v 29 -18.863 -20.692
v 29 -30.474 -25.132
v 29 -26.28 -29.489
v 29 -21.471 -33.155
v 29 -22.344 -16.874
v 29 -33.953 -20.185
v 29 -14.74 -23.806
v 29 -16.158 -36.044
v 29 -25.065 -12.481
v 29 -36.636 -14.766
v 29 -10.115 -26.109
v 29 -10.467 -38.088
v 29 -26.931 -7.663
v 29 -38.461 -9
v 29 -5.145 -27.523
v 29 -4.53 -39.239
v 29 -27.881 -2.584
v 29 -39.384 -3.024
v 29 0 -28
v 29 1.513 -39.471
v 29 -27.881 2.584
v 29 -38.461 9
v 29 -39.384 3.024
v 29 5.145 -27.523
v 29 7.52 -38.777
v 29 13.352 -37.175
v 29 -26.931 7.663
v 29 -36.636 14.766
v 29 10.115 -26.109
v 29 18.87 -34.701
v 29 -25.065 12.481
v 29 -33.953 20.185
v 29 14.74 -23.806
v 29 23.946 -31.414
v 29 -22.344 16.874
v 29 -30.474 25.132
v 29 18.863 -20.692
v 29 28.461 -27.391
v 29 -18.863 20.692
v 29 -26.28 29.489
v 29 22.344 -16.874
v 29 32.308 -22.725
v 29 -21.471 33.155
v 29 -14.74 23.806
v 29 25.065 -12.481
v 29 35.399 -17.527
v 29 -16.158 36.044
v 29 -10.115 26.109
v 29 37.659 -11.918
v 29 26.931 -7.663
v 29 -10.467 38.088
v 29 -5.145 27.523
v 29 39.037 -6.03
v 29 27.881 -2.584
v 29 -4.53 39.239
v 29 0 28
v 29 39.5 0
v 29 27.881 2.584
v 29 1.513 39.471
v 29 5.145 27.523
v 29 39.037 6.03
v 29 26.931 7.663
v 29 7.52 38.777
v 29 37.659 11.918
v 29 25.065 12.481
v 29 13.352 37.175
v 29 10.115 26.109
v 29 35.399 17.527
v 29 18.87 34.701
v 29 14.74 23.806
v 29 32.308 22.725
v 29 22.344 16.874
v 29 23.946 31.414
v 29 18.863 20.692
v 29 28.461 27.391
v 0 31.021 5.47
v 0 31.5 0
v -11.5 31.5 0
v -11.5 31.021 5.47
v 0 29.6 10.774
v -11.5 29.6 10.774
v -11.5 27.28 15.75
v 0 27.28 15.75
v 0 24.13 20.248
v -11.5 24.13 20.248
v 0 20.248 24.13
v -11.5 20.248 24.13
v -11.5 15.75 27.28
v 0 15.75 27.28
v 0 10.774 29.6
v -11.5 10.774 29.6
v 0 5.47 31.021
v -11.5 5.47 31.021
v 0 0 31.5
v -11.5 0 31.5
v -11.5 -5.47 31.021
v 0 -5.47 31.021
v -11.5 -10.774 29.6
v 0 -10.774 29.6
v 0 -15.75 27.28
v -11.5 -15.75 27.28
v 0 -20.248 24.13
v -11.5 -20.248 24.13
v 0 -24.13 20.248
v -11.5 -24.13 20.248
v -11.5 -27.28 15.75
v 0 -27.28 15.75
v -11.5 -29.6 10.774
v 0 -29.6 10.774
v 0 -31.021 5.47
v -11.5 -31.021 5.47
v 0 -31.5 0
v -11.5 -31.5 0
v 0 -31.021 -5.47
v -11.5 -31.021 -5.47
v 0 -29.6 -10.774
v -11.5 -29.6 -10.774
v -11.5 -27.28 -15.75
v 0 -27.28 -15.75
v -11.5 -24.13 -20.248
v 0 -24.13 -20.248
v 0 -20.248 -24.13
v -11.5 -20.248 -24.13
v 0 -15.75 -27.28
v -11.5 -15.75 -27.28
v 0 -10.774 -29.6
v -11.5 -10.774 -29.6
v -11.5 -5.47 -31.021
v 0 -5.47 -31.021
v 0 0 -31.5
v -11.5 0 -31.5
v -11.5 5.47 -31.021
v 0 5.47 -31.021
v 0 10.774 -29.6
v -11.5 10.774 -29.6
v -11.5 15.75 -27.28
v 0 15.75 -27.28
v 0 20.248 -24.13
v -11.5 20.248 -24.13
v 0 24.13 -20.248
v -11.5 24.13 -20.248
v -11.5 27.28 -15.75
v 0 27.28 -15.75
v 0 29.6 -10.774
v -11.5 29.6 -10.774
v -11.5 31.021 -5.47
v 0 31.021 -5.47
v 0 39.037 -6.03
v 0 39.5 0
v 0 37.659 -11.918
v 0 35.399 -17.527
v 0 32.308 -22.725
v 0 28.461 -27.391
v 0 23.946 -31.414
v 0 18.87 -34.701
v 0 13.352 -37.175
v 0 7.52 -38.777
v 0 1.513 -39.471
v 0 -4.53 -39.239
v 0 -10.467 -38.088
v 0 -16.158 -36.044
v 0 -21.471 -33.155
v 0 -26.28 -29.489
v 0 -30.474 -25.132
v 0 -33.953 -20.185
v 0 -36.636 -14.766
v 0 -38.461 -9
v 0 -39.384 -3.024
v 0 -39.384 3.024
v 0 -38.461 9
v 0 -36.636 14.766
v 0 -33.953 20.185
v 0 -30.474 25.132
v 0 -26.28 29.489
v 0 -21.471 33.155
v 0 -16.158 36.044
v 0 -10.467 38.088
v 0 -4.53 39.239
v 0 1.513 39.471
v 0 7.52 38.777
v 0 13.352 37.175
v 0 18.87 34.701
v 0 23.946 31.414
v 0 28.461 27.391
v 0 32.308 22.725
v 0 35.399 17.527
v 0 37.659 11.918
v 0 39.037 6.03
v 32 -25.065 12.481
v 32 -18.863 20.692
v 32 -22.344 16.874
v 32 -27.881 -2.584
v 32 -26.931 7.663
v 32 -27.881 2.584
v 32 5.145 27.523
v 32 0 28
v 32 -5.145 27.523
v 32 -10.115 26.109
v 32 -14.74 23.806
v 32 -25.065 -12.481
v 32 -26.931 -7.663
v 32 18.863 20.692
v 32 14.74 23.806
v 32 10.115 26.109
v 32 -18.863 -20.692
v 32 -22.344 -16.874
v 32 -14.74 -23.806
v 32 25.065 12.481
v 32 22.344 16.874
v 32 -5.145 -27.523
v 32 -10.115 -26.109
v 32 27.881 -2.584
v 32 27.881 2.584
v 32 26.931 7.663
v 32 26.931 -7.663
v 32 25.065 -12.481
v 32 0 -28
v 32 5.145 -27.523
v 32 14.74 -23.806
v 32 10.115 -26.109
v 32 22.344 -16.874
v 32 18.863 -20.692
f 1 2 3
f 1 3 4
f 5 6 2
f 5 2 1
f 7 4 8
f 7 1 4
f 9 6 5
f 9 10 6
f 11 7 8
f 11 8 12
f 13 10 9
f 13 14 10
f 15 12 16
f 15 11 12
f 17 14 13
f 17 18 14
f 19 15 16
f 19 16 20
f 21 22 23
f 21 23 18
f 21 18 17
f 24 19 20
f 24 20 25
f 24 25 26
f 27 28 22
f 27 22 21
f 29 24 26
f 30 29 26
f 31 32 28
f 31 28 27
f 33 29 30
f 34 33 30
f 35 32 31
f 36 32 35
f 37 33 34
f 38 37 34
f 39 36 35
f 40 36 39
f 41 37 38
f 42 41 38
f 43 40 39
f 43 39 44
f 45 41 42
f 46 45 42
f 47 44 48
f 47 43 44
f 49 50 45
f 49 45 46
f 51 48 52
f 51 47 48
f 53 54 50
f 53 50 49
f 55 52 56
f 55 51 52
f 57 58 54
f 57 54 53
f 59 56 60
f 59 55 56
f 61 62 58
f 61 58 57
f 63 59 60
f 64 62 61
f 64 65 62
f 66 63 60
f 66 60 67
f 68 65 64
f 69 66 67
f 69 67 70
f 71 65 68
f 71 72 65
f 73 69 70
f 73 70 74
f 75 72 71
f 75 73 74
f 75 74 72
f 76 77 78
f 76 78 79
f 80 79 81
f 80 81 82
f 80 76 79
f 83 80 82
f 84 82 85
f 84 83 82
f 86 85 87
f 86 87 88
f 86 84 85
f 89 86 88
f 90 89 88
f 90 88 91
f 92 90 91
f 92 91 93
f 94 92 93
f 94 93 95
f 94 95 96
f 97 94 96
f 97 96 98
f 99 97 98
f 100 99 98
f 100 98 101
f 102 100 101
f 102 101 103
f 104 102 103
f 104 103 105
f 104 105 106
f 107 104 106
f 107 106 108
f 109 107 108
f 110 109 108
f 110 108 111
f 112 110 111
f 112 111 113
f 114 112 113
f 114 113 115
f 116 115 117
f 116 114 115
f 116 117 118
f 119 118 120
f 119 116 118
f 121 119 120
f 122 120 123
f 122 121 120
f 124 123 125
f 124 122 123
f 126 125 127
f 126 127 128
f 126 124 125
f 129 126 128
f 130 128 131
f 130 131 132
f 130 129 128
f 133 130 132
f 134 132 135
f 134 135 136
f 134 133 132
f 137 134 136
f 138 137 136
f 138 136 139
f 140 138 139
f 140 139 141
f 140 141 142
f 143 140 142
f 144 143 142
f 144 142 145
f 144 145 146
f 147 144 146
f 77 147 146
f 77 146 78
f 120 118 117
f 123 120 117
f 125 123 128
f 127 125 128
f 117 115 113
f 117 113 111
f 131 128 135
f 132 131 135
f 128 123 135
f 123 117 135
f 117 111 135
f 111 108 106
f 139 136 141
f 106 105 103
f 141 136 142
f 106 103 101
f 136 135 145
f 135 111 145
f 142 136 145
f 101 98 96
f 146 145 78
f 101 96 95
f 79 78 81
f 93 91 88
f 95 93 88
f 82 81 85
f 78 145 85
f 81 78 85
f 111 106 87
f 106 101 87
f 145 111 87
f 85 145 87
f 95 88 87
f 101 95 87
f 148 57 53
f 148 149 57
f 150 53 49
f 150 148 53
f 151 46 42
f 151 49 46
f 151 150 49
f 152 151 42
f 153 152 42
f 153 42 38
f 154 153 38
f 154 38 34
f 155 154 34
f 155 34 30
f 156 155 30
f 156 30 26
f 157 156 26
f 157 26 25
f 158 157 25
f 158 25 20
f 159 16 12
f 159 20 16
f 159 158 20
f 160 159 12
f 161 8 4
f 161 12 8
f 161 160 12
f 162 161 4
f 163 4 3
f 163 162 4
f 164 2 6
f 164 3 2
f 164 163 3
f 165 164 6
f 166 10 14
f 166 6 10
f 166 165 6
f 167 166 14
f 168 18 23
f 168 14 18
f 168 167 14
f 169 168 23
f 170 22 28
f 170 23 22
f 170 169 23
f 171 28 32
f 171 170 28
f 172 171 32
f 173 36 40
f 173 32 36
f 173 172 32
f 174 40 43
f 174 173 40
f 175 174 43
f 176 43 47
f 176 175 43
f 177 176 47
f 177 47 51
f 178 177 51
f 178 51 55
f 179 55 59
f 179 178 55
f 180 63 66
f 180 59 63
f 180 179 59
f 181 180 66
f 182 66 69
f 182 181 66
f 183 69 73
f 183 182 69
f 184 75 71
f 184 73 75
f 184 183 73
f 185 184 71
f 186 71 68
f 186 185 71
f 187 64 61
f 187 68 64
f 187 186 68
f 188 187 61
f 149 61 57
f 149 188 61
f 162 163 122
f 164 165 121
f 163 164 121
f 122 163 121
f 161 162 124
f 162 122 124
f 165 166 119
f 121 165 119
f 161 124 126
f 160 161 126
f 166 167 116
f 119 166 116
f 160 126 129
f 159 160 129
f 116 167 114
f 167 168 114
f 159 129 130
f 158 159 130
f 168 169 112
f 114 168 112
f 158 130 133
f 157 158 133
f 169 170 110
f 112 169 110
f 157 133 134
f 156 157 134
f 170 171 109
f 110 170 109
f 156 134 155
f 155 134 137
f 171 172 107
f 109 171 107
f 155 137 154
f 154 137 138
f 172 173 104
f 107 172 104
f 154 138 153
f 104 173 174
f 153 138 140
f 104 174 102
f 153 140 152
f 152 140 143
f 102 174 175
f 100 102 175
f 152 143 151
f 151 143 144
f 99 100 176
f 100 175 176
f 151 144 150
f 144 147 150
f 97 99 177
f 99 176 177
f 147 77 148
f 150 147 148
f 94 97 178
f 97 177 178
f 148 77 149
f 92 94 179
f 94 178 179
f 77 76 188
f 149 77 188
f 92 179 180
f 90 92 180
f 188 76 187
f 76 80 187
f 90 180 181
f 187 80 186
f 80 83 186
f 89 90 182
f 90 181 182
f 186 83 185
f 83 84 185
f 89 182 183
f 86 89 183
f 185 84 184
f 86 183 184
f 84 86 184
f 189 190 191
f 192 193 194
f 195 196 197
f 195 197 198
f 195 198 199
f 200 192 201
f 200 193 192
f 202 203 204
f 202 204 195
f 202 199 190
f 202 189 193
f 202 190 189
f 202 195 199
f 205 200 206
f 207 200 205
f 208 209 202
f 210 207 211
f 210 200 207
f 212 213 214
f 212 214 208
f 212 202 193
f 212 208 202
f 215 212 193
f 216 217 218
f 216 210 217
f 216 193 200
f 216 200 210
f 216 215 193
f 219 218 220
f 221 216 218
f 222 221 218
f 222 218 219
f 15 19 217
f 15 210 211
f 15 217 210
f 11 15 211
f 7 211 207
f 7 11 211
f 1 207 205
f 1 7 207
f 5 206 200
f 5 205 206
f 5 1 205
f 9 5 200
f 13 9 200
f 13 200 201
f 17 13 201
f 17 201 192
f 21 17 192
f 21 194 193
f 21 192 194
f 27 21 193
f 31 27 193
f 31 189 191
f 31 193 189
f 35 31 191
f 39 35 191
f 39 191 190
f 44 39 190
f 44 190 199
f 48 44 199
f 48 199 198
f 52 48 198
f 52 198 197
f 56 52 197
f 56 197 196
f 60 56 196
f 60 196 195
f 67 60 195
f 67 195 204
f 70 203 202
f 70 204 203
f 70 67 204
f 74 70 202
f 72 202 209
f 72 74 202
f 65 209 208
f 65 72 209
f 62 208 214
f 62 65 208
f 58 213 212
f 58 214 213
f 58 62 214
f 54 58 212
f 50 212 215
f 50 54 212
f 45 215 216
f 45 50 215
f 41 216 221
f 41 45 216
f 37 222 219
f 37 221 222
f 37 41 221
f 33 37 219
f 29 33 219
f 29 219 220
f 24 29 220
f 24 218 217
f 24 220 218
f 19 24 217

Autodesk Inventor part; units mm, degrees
ref_plane "YZ Plane" through (0, 0, 0) normal (1, 0, 0) x (0, 1, 0)
ref_plane "XZ Plane" through (0, 0, 0) normal (0, 1, 0) x (-1, 0, 0)
ref_plane "XY Plane" through (0, 0, 0) normal (0, 0, 1) x (1, 0, 0)
sketch "Sketch1" plane through (0, 0, 0) normal (1, 0, 0) x (0, 1, 0)
  circle A0 centre (0, 0) radius 31.5
  circle A1 centre (0, 0) radius 39.5
  dimension "d0" = 79
  dimension "d1" = 63
extrude "Extrusion1" add sketch "Sketch1" against normal blind 11.5 contours A0
extrude "Extrusion2" add sketch "Sketch1" along normal blind 29 contours A0 | A1
sketch "Sketch2" plane through (29, 0, 0) normal (1, 0, 0) x (0, 0, -1)
  circle A0 centre (0, 0) radius 28
  dimension "d12" = 56
extrude "Extrusion3" add sketch "Sketch2" along normal blind 3
properties part number "motor"
